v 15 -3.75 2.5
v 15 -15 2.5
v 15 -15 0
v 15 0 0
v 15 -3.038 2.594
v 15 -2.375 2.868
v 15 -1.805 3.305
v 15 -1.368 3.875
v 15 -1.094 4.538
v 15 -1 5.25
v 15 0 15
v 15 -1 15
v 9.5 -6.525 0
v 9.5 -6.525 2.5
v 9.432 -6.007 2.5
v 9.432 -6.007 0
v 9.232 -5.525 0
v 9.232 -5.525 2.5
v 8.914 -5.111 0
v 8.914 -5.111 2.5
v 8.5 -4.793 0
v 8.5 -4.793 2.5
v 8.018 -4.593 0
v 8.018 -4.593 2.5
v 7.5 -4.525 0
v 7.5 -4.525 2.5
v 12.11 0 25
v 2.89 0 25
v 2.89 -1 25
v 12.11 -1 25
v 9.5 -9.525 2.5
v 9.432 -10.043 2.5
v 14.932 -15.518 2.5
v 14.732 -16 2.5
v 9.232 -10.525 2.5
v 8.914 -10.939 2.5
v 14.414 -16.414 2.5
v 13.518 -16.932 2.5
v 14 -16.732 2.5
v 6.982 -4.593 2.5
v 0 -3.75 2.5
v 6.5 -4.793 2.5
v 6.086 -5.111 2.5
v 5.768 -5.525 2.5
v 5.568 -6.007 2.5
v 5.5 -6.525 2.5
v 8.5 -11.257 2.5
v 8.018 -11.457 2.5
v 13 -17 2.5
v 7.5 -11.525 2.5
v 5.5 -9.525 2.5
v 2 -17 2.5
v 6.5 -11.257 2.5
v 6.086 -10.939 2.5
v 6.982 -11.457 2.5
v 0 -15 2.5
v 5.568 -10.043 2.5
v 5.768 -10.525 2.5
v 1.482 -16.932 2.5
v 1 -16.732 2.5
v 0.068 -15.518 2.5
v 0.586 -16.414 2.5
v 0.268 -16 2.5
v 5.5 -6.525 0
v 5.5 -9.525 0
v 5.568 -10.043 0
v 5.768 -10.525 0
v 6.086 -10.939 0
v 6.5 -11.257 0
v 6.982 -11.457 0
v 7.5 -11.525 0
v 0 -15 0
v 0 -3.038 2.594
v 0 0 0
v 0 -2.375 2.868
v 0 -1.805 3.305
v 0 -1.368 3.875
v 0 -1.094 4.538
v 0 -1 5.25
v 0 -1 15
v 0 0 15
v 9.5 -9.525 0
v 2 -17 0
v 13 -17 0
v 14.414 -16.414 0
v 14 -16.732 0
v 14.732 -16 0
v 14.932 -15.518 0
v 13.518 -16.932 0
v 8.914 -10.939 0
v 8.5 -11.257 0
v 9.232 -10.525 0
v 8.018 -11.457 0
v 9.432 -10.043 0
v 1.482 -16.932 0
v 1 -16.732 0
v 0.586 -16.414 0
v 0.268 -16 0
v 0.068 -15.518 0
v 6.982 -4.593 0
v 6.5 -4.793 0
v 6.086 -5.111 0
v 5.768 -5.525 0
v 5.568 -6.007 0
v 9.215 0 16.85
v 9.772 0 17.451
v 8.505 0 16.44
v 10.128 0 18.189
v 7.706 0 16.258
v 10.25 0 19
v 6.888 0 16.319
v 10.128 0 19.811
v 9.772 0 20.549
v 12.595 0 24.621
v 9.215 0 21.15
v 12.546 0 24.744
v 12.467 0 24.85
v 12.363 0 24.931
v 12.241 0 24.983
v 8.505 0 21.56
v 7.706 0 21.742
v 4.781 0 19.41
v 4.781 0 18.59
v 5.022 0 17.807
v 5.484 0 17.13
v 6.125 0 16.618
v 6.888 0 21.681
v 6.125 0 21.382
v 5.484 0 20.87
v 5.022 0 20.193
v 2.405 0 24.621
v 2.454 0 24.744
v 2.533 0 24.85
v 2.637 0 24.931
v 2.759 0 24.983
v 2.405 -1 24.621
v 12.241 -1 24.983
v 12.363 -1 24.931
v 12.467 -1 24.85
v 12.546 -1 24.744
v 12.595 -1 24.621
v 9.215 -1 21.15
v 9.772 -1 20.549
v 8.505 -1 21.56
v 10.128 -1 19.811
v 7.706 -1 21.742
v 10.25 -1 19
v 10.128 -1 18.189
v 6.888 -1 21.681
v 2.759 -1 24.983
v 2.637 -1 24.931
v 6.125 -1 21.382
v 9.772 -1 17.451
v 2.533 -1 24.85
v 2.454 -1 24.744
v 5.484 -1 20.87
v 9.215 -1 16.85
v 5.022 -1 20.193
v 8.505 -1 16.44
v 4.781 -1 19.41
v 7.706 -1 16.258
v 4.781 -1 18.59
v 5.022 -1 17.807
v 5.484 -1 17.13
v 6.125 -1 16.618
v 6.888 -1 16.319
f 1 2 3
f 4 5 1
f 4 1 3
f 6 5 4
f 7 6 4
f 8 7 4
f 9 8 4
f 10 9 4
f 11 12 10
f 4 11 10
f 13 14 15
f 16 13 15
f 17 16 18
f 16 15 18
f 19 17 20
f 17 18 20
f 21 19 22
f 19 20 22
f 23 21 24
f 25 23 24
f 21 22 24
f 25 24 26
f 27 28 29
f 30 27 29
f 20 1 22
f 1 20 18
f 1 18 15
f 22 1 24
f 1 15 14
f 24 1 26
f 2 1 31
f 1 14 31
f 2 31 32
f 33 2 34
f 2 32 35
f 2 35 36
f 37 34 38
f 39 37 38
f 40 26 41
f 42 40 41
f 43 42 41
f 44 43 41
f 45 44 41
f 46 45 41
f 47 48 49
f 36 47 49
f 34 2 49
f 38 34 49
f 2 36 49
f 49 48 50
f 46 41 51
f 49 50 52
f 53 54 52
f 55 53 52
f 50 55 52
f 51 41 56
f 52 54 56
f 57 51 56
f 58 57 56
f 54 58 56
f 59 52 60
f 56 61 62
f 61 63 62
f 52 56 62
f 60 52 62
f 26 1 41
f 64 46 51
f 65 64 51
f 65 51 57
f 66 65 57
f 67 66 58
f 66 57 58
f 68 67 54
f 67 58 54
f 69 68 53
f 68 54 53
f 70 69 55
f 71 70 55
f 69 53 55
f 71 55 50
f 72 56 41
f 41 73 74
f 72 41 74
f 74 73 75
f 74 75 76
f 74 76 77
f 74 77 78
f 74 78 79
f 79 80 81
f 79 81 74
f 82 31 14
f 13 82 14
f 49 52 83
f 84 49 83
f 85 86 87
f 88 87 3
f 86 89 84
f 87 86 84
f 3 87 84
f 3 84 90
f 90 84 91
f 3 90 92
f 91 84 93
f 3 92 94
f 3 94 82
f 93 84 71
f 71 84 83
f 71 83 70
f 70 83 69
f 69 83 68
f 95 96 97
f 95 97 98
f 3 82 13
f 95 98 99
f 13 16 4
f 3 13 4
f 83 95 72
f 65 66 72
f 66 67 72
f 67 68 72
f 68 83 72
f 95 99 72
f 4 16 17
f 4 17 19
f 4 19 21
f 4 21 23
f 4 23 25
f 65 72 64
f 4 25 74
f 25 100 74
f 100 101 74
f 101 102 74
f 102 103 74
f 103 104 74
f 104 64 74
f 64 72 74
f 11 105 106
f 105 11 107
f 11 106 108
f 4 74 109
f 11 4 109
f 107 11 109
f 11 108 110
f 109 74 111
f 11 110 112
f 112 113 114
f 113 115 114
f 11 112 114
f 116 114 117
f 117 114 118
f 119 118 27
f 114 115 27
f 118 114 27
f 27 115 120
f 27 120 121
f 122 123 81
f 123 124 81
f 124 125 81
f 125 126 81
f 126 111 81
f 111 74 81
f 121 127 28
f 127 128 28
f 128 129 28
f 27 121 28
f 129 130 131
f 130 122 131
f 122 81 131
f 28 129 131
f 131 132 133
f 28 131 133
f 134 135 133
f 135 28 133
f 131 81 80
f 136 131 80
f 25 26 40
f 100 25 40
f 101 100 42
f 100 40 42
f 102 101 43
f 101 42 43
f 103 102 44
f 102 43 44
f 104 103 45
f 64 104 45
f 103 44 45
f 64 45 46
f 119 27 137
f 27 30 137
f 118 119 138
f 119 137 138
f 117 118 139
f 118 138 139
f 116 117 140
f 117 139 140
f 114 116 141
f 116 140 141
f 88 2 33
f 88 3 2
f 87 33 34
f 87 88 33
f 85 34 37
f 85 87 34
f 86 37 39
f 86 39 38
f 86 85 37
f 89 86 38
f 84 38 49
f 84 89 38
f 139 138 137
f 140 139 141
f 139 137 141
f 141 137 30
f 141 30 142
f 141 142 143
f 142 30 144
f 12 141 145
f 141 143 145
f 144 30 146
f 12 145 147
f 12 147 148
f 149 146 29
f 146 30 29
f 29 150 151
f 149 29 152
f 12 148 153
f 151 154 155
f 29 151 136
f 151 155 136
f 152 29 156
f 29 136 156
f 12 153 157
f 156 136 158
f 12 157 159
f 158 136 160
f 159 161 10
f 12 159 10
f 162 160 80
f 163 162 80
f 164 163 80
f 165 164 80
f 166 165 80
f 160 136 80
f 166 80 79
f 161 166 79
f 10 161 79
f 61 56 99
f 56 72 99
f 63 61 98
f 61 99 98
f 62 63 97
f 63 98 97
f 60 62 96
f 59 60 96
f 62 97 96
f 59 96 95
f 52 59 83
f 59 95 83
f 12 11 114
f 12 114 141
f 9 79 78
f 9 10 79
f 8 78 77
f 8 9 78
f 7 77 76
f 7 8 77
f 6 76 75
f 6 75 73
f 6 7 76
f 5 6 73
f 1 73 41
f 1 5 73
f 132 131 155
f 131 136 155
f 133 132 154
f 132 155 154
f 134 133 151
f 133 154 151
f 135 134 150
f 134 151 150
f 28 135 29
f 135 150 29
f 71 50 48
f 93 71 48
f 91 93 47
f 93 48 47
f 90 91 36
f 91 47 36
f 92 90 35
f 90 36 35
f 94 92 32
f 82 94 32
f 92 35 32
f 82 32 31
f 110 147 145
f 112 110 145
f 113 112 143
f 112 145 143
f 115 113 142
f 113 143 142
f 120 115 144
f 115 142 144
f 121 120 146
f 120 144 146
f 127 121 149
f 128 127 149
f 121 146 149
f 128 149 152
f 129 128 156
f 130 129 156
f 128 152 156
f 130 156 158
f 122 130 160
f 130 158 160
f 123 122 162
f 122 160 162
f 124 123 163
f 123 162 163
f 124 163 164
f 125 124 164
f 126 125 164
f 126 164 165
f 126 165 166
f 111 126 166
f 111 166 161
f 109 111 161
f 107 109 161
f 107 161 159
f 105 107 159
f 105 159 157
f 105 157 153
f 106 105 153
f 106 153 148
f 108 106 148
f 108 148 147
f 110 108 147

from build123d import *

# Parameters (mm, degrees)
F1_DEPTH = 15
F2_R     = 2.75
F3_R     = 2
F5_DEPTH = 2.5
F6_SIZE2 = 10
F6_SIZE  = 2.5
F7_R     = 2.75
F8_DEPTH = 3
F9_R     = 0.5


with BuildPart() as f1:
    # F0 (on Right) → F1 (new body)
    with BuildSketch(Plane.YZ):
        Polygon((-17, 0), (0, 0), (0, 25), (-1, 25), (-1, 2.5), (-17, 2.5), align=None)
    extrude(amount=F1_DEPTH)

    # F2
    f2_edges = [f1.edges().sort_by_distance(p)[0] for p in [
        (7.5, -1, 2.5),
    ]]
    fillet(f2_edges, radius=F2_R)

    # F3
    f3_edges = [f1.edges().sort_by_distance(p)[0] for p in [
        (15, -17, 1.25),
        (0, -17, 1.25),
    ]]
    fillet(f3_edges, radius=F3_R)

    # F4 (on face) → F5 (cut)
    with BuildSketch(Plane.XY.offset(2.5)):
        with BuildLine():
            Line((9.5, -9.525), (9.5, -6.525))
            ThreePointArc((9.5, -6.525), (8.9142135624, -5.1107864376), (7.5, -4.525))
            ThreePointArc((7.5, -4.525), (6.0857864376, -5.1107864376), (5.5, -6.525))
            Line((5.5, -6.525), (5.5, -9.525))
            ThreePointArc((5.5, -9.525), (6.0857864376, -10.9392135624), (7.5, -11.525))
            ThreePointArc((7.5, -11.525), (8.9142135624, -10.9392135624), (9.5, -9.525))
        make_face()
    extrude(amount=-F5_DEPTH, mode=Mode.SUBTRACT)

    # F6
    f6_edges = [f1.edges().sort_by_distance(p)[0] for p in [
        (15, -0.5, 25),
        (0, -0.5, 25),
    ]]
    f6_side = f1.faces().sort_by_distance((7.5, -0.5, 25))[0]
    chamfer(f6_edges, length=F6_SIZE, length2=F6_SIZE2, reference=f6_side)

    # F7 (on face) → F8 (cut)
    with BuildSketch(Plane.XZ.offset(1)):
        with Locations((7.5, 19)):
            Circle(F7_R)
    extrude(amount=-F8_DEPTH, mode=Mode.SUBTRACT)

    # F9
    f9_edges = [f1.edges().sort_by_distance(p)[0] for p in [
        (12.5, -0.5, 25),
        (2.5, -0.5, 25),
    ]]
    fillet(f9_edges, radius=F9_R)


solid = f1.part
